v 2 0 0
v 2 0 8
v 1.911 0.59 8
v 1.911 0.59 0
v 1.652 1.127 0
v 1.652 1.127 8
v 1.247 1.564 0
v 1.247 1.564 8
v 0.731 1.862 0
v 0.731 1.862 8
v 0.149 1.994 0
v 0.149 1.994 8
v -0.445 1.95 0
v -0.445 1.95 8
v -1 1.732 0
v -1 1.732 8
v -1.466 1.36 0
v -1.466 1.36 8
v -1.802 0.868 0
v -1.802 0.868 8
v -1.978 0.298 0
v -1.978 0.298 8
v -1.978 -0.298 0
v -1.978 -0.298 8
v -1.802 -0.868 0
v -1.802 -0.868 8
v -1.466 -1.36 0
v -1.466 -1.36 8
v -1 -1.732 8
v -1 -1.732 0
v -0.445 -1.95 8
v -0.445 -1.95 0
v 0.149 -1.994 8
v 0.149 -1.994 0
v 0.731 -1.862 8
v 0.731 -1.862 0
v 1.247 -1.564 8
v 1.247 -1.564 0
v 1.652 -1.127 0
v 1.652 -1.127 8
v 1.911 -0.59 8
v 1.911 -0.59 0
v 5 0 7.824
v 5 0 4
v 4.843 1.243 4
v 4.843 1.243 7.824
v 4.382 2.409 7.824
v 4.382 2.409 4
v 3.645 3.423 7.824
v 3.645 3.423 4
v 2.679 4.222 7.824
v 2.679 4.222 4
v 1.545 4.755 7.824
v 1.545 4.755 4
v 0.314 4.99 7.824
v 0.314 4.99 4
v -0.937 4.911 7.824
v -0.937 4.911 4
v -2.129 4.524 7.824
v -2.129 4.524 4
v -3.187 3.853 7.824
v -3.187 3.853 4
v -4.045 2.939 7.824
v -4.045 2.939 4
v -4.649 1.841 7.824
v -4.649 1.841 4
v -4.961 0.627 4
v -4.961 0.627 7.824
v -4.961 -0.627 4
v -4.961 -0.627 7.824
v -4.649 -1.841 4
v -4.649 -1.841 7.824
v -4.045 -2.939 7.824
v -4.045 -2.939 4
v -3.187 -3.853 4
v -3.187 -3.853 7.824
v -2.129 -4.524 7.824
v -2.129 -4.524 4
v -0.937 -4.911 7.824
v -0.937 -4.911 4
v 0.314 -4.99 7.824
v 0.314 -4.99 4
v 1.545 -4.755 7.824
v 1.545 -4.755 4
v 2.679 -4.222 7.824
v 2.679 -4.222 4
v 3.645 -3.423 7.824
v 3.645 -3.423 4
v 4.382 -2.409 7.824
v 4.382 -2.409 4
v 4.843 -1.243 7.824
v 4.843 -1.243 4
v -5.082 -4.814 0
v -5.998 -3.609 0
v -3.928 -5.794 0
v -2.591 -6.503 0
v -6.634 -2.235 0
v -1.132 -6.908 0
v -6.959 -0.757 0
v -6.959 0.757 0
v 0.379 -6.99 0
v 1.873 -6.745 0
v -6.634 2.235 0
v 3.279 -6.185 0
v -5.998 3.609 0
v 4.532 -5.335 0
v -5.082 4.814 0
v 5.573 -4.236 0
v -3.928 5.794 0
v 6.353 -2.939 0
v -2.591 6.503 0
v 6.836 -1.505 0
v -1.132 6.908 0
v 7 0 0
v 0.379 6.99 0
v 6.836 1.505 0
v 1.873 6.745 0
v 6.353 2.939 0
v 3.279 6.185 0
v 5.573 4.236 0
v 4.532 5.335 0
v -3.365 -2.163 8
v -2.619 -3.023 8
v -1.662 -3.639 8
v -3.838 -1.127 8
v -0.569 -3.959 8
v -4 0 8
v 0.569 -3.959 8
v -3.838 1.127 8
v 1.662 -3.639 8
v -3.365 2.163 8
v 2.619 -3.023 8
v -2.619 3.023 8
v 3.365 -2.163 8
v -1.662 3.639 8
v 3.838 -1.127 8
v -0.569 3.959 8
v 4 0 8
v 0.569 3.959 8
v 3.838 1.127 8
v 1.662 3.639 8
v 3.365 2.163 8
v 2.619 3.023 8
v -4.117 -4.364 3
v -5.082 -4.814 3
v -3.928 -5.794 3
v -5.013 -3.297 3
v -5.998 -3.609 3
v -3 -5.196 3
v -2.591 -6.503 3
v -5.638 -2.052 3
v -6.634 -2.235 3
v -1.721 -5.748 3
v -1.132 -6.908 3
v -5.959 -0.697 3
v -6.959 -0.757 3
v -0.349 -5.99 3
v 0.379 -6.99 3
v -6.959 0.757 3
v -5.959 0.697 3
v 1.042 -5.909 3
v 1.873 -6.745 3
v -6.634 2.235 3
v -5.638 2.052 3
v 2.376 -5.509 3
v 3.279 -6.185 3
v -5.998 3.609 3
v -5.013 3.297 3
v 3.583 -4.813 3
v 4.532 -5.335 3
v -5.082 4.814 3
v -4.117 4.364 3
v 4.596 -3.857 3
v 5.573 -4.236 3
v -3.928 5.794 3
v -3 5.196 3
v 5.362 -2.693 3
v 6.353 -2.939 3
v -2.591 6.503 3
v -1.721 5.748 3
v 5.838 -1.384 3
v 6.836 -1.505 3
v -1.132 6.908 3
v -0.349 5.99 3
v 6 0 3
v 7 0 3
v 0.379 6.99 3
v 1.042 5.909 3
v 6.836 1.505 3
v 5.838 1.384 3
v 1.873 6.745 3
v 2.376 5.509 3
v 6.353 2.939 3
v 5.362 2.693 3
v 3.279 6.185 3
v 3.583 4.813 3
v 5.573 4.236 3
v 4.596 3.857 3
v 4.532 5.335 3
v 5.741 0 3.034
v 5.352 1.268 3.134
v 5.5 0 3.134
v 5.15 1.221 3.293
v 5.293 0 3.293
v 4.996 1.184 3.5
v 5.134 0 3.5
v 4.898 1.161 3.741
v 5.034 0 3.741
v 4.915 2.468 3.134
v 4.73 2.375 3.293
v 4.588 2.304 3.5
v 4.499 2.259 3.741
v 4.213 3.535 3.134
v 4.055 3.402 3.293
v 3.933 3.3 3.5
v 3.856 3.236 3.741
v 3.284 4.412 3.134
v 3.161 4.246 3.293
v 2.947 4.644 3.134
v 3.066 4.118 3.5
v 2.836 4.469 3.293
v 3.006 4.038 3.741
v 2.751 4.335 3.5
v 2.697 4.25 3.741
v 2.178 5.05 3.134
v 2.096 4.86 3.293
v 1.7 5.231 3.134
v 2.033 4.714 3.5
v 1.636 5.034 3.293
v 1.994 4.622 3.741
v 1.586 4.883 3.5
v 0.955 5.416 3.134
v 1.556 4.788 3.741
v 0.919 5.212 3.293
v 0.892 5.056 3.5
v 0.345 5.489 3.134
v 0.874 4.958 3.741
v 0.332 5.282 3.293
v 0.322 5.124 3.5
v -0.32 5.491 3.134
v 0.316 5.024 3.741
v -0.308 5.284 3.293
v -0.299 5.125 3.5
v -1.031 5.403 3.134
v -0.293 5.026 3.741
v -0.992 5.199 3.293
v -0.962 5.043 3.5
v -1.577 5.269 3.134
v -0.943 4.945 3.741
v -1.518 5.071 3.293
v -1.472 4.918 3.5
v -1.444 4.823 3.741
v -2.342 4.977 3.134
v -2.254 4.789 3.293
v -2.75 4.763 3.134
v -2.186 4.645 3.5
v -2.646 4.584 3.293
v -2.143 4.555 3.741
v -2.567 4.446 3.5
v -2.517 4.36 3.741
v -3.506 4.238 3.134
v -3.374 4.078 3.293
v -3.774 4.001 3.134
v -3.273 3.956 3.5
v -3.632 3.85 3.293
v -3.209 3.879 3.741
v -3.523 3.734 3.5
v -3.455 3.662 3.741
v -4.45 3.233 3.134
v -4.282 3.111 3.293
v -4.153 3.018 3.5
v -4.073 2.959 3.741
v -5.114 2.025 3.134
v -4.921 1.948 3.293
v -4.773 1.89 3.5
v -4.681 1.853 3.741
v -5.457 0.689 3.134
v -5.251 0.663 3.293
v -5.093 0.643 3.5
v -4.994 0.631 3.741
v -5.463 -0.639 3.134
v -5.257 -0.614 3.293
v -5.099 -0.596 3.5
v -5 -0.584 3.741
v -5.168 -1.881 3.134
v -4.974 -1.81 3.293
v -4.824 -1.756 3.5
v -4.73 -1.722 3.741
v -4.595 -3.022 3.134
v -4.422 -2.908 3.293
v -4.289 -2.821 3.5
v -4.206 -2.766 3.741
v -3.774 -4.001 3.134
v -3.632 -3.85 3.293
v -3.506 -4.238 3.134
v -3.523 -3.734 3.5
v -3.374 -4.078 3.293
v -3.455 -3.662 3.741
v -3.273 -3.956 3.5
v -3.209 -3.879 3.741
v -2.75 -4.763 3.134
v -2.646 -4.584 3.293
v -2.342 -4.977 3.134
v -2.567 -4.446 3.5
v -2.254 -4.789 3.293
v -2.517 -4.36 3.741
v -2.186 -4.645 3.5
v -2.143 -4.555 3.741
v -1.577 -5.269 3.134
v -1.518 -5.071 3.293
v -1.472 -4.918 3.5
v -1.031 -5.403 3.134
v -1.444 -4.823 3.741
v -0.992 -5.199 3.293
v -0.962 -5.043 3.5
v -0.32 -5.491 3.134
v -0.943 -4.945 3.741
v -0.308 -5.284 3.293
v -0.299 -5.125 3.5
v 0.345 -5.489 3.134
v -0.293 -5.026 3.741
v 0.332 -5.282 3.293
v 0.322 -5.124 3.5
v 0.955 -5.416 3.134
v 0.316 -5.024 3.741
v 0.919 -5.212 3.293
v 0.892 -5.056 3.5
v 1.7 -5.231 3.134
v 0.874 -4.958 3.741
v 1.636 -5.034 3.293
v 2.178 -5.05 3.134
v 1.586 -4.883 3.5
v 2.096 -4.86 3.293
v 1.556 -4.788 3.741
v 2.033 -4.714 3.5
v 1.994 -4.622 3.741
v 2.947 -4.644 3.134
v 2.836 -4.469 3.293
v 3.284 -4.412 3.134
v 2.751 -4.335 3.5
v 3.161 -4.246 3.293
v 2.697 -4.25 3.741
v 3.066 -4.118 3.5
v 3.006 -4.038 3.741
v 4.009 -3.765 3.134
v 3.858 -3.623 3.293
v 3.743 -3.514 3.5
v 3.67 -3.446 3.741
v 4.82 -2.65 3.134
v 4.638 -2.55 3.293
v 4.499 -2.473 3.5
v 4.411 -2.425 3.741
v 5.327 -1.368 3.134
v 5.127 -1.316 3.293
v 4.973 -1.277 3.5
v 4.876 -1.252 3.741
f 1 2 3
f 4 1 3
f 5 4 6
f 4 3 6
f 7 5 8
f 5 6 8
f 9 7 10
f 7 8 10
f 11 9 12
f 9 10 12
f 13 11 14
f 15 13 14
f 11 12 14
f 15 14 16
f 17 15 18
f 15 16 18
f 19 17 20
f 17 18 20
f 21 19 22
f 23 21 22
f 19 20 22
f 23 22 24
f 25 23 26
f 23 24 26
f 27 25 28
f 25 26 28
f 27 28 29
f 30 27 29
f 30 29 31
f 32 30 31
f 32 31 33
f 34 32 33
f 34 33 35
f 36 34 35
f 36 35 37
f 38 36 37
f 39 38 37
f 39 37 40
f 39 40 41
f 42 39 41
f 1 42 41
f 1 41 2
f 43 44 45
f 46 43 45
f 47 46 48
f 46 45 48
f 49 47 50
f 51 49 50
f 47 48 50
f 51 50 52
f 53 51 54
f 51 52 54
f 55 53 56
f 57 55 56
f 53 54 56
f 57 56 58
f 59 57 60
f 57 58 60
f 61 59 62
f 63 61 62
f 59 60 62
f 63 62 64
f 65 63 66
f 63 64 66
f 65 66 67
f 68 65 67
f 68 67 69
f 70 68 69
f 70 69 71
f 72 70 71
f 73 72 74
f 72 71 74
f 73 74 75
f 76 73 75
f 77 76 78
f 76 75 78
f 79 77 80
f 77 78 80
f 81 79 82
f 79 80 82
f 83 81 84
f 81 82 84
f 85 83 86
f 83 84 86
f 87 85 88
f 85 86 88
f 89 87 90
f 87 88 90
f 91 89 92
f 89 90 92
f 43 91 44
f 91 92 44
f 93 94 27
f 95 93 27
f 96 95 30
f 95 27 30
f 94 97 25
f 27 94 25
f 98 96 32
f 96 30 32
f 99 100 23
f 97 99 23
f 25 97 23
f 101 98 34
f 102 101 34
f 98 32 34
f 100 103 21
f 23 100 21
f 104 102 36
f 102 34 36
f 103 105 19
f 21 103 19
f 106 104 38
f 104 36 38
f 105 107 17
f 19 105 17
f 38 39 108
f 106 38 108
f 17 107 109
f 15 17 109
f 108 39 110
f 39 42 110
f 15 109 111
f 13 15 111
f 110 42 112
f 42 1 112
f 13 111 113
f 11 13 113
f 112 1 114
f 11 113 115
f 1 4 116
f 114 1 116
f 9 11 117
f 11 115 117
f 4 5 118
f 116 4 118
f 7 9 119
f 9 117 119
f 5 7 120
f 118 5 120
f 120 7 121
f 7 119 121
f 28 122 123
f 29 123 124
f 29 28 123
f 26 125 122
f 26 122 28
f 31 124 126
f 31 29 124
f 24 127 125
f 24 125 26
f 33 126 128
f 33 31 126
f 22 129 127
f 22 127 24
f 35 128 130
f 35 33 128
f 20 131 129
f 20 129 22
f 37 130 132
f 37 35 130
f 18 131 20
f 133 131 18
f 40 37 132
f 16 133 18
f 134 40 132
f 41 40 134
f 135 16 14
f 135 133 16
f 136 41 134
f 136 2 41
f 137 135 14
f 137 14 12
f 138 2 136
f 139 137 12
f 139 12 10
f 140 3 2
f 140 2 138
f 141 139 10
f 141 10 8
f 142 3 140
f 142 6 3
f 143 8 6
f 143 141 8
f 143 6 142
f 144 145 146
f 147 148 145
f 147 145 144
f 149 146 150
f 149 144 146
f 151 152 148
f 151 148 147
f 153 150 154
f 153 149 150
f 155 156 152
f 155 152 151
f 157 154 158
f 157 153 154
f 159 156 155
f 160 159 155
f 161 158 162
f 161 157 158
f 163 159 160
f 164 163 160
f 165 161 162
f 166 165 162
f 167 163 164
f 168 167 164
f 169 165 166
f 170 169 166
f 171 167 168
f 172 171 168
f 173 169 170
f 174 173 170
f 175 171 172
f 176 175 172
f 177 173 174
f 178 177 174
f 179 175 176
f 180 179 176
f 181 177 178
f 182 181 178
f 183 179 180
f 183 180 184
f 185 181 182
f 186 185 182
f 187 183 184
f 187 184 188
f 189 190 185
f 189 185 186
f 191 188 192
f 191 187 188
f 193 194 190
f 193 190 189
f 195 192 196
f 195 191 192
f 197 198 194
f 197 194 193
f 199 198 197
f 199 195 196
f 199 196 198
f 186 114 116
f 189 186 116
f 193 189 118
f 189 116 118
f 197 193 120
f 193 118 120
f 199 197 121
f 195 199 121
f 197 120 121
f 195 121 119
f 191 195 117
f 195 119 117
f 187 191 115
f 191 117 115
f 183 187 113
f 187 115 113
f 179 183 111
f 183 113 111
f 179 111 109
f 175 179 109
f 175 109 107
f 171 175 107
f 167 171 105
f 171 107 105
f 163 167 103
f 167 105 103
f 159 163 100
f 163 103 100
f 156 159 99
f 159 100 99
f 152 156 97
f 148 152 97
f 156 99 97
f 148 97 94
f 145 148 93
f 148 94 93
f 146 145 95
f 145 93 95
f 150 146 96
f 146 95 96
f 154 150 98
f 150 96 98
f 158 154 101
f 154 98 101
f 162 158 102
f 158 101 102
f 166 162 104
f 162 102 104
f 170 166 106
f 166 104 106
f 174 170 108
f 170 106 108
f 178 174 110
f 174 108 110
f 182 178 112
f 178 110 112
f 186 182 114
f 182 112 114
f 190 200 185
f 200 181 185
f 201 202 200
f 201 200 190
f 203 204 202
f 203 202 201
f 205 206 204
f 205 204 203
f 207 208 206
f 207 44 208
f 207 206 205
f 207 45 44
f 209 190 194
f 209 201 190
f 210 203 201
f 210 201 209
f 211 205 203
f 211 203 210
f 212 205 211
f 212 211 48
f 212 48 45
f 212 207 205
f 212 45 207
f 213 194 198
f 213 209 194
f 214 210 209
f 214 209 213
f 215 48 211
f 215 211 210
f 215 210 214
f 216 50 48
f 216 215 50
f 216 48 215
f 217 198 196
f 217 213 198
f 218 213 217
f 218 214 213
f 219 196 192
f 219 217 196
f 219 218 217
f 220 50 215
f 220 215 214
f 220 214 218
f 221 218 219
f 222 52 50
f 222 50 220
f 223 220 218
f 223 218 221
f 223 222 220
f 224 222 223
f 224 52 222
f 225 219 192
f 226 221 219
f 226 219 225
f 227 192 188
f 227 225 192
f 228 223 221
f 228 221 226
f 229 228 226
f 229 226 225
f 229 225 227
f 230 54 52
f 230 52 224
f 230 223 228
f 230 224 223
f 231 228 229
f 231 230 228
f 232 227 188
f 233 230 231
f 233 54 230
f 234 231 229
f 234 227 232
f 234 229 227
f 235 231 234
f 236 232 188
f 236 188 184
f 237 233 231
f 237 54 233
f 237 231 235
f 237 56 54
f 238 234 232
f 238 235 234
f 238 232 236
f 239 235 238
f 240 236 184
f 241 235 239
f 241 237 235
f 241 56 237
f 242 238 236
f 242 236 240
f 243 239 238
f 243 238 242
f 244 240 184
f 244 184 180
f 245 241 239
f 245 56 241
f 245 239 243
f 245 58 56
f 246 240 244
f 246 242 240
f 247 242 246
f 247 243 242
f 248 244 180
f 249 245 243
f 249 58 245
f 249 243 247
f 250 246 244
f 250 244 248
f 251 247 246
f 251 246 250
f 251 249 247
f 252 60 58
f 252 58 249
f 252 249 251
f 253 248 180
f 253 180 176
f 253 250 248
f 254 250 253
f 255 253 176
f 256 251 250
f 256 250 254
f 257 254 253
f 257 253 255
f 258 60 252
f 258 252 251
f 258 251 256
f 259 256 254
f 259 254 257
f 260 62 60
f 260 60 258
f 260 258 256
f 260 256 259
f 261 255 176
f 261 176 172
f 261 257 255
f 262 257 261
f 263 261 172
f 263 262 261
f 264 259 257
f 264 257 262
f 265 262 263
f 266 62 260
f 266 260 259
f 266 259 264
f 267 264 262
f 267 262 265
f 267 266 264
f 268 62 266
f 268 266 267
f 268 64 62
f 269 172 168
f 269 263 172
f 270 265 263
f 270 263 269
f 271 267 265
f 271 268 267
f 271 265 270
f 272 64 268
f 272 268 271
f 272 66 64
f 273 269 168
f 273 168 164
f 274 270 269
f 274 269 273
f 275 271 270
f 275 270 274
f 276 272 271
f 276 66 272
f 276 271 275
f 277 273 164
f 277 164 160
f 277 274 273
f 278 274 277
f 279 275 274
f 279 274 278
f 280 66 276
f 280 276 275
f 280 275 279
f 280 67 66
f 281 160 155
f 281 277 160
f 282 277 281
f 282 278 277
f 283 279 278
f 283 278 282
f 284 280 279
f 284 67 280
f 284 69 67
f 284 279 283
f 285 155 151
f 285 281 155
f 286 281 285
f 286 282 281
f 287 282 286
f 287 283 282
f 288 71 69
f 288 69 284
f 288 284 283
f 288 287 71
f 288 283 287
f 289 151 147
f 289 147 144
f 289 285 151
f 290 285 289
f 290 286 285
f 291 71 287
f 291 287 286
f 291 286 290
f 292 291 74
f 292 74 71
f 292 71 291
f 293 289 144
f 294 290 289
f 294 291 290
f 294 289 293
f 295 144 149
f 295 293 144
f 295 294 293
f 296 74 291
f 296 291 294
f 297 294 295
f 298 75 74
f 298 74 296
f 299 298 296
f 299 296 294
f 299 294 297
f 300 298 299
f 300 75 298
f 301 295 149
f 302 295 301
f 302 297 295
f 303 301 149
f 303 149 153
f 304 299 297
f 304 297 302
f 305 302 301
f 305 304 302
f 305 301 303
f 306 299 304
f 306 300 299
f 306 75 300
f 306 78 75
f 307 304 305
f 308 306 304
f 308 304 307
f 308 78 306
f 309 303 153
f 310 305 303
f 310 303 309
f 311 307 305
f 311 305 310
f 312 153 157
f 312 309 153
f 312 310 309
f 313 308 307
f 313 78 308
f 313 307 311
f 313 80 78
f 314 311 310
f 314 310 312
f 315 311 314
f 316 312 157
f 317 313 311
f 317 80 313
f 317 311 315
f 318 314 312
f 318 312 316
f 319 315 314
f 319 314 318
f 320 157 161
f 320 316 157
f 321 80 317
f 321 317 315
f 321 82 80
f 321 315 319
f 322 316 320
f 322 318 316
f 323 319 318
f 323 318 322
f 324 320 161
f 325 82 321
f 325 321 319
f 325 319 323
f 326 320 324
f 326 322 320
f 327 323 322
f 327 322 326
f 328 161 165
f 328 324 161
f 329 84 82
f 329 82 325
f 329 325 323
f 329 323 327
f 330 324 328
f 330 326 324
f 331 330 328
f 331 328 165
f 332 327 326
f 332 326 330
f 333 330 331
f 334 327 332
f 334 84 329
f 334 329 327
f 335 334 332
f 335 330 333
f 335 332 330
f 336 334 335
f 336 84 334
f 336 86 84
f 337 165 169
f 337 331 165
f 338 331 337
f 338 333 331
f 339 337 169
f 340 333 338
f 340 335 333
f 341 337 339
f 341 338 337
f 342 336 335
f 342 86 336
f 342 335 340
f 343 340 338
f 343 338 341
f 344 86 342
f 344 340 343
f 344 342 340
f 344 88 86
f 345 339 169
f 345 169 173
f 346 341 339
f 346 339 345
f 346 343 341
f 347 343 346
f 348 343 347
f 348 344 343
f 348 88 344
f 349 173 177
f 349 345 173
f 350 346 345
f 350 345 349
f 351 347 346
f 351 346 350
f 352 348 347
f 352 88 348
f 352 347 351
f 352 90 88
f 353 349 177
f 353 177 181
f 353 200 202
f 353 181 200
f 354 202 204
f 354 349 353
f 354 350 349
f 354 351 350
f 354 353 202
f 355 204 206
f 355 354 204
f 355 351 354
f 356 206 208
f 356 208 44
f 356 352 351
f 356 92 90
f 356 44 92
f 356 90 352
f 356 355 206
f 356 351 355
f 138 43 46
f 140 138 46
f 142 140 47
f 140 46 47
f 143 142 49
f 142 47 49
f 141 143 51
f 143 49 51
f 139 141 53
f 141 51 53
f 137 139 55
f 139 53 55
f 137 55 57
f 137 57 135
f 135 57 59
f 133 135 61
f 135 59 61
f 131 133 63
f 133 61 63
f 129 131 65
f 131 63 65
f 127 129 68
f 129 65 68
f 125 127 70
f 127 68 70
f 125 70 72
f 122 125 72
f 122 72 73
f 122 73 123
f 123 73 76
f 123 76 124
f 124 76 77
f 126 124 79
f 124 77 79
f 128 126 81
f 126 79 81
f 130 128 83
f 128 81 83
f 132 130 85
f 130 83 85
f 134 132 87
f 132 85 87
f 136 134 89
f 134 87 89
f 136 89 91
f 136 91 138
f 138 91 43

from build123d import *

# Parameters (mm, degrees)
ESQUISSE1_R             = 7
BOSS_EXTRU_1_DEPTH      = 3
ESQUISSE2_R             = 5
BOSS_EXTRU_2_DEPTH      = 5
ESQUISSE3_R             = 2
ENL_V_MAT_EXTRU_1_DEPTH = 9
CONG_1_R                = 1
CHANFREIN1_SIZE         = 1
CHANFREIN1_SIZE2        = 0.176326981


with BuildPart() as part:
    # Esquisse1 → Boss.-Extru.1 (new body)
    with BuildSketch(Plane.XY):
        Circle(ESQUISSE1_R)
    extrude(amount=BOSS_EXTRU_1_DEPTH)

    # Esquisse2 → Boss.-Extru.2 (add)
    with BuildSketch(Plane.XY.offset(3)):
        Circle(ESQUISSE2_R)
    extrude(amount=BOSS_EXTRU_2_DEPTH)

    # Esquisse3 → Enlèv. mat.-Extru.1 (cut, through all)
    with BuildSketch(Plane.XY.offset(8)):
        Circle(ESQUISSE3_R)
    extrude(amount=-ENL_V_MAT_EXTRU_1_DEPTH, mode=Mode.SUBTRACT)

    # Congé1
    cong_1_edges = [part.edges().sort_by_distance(p)[0] for p in [
        (-5, 0, 3),
    ]]
    fillet(cong_1_edges, radius=CONG_1_R)

    # Chanfrein1
    chanfrein1_edges = [part.edges().sort_by_distance(p)[0] for p in [
        (-5, 0, 8),
    ]]
    chanfrein1_side = [part.faces().sort_by_distance(p)[0] for p in [
        (-4.858578644, 0, 8),
    ]]
    chamfer(chanfrein1_edges, length=CHANFREIN1_SIZE, length2=CHANFREIN1_SIZE2, reference=chanfrein1_side[0])


solid = part.part
